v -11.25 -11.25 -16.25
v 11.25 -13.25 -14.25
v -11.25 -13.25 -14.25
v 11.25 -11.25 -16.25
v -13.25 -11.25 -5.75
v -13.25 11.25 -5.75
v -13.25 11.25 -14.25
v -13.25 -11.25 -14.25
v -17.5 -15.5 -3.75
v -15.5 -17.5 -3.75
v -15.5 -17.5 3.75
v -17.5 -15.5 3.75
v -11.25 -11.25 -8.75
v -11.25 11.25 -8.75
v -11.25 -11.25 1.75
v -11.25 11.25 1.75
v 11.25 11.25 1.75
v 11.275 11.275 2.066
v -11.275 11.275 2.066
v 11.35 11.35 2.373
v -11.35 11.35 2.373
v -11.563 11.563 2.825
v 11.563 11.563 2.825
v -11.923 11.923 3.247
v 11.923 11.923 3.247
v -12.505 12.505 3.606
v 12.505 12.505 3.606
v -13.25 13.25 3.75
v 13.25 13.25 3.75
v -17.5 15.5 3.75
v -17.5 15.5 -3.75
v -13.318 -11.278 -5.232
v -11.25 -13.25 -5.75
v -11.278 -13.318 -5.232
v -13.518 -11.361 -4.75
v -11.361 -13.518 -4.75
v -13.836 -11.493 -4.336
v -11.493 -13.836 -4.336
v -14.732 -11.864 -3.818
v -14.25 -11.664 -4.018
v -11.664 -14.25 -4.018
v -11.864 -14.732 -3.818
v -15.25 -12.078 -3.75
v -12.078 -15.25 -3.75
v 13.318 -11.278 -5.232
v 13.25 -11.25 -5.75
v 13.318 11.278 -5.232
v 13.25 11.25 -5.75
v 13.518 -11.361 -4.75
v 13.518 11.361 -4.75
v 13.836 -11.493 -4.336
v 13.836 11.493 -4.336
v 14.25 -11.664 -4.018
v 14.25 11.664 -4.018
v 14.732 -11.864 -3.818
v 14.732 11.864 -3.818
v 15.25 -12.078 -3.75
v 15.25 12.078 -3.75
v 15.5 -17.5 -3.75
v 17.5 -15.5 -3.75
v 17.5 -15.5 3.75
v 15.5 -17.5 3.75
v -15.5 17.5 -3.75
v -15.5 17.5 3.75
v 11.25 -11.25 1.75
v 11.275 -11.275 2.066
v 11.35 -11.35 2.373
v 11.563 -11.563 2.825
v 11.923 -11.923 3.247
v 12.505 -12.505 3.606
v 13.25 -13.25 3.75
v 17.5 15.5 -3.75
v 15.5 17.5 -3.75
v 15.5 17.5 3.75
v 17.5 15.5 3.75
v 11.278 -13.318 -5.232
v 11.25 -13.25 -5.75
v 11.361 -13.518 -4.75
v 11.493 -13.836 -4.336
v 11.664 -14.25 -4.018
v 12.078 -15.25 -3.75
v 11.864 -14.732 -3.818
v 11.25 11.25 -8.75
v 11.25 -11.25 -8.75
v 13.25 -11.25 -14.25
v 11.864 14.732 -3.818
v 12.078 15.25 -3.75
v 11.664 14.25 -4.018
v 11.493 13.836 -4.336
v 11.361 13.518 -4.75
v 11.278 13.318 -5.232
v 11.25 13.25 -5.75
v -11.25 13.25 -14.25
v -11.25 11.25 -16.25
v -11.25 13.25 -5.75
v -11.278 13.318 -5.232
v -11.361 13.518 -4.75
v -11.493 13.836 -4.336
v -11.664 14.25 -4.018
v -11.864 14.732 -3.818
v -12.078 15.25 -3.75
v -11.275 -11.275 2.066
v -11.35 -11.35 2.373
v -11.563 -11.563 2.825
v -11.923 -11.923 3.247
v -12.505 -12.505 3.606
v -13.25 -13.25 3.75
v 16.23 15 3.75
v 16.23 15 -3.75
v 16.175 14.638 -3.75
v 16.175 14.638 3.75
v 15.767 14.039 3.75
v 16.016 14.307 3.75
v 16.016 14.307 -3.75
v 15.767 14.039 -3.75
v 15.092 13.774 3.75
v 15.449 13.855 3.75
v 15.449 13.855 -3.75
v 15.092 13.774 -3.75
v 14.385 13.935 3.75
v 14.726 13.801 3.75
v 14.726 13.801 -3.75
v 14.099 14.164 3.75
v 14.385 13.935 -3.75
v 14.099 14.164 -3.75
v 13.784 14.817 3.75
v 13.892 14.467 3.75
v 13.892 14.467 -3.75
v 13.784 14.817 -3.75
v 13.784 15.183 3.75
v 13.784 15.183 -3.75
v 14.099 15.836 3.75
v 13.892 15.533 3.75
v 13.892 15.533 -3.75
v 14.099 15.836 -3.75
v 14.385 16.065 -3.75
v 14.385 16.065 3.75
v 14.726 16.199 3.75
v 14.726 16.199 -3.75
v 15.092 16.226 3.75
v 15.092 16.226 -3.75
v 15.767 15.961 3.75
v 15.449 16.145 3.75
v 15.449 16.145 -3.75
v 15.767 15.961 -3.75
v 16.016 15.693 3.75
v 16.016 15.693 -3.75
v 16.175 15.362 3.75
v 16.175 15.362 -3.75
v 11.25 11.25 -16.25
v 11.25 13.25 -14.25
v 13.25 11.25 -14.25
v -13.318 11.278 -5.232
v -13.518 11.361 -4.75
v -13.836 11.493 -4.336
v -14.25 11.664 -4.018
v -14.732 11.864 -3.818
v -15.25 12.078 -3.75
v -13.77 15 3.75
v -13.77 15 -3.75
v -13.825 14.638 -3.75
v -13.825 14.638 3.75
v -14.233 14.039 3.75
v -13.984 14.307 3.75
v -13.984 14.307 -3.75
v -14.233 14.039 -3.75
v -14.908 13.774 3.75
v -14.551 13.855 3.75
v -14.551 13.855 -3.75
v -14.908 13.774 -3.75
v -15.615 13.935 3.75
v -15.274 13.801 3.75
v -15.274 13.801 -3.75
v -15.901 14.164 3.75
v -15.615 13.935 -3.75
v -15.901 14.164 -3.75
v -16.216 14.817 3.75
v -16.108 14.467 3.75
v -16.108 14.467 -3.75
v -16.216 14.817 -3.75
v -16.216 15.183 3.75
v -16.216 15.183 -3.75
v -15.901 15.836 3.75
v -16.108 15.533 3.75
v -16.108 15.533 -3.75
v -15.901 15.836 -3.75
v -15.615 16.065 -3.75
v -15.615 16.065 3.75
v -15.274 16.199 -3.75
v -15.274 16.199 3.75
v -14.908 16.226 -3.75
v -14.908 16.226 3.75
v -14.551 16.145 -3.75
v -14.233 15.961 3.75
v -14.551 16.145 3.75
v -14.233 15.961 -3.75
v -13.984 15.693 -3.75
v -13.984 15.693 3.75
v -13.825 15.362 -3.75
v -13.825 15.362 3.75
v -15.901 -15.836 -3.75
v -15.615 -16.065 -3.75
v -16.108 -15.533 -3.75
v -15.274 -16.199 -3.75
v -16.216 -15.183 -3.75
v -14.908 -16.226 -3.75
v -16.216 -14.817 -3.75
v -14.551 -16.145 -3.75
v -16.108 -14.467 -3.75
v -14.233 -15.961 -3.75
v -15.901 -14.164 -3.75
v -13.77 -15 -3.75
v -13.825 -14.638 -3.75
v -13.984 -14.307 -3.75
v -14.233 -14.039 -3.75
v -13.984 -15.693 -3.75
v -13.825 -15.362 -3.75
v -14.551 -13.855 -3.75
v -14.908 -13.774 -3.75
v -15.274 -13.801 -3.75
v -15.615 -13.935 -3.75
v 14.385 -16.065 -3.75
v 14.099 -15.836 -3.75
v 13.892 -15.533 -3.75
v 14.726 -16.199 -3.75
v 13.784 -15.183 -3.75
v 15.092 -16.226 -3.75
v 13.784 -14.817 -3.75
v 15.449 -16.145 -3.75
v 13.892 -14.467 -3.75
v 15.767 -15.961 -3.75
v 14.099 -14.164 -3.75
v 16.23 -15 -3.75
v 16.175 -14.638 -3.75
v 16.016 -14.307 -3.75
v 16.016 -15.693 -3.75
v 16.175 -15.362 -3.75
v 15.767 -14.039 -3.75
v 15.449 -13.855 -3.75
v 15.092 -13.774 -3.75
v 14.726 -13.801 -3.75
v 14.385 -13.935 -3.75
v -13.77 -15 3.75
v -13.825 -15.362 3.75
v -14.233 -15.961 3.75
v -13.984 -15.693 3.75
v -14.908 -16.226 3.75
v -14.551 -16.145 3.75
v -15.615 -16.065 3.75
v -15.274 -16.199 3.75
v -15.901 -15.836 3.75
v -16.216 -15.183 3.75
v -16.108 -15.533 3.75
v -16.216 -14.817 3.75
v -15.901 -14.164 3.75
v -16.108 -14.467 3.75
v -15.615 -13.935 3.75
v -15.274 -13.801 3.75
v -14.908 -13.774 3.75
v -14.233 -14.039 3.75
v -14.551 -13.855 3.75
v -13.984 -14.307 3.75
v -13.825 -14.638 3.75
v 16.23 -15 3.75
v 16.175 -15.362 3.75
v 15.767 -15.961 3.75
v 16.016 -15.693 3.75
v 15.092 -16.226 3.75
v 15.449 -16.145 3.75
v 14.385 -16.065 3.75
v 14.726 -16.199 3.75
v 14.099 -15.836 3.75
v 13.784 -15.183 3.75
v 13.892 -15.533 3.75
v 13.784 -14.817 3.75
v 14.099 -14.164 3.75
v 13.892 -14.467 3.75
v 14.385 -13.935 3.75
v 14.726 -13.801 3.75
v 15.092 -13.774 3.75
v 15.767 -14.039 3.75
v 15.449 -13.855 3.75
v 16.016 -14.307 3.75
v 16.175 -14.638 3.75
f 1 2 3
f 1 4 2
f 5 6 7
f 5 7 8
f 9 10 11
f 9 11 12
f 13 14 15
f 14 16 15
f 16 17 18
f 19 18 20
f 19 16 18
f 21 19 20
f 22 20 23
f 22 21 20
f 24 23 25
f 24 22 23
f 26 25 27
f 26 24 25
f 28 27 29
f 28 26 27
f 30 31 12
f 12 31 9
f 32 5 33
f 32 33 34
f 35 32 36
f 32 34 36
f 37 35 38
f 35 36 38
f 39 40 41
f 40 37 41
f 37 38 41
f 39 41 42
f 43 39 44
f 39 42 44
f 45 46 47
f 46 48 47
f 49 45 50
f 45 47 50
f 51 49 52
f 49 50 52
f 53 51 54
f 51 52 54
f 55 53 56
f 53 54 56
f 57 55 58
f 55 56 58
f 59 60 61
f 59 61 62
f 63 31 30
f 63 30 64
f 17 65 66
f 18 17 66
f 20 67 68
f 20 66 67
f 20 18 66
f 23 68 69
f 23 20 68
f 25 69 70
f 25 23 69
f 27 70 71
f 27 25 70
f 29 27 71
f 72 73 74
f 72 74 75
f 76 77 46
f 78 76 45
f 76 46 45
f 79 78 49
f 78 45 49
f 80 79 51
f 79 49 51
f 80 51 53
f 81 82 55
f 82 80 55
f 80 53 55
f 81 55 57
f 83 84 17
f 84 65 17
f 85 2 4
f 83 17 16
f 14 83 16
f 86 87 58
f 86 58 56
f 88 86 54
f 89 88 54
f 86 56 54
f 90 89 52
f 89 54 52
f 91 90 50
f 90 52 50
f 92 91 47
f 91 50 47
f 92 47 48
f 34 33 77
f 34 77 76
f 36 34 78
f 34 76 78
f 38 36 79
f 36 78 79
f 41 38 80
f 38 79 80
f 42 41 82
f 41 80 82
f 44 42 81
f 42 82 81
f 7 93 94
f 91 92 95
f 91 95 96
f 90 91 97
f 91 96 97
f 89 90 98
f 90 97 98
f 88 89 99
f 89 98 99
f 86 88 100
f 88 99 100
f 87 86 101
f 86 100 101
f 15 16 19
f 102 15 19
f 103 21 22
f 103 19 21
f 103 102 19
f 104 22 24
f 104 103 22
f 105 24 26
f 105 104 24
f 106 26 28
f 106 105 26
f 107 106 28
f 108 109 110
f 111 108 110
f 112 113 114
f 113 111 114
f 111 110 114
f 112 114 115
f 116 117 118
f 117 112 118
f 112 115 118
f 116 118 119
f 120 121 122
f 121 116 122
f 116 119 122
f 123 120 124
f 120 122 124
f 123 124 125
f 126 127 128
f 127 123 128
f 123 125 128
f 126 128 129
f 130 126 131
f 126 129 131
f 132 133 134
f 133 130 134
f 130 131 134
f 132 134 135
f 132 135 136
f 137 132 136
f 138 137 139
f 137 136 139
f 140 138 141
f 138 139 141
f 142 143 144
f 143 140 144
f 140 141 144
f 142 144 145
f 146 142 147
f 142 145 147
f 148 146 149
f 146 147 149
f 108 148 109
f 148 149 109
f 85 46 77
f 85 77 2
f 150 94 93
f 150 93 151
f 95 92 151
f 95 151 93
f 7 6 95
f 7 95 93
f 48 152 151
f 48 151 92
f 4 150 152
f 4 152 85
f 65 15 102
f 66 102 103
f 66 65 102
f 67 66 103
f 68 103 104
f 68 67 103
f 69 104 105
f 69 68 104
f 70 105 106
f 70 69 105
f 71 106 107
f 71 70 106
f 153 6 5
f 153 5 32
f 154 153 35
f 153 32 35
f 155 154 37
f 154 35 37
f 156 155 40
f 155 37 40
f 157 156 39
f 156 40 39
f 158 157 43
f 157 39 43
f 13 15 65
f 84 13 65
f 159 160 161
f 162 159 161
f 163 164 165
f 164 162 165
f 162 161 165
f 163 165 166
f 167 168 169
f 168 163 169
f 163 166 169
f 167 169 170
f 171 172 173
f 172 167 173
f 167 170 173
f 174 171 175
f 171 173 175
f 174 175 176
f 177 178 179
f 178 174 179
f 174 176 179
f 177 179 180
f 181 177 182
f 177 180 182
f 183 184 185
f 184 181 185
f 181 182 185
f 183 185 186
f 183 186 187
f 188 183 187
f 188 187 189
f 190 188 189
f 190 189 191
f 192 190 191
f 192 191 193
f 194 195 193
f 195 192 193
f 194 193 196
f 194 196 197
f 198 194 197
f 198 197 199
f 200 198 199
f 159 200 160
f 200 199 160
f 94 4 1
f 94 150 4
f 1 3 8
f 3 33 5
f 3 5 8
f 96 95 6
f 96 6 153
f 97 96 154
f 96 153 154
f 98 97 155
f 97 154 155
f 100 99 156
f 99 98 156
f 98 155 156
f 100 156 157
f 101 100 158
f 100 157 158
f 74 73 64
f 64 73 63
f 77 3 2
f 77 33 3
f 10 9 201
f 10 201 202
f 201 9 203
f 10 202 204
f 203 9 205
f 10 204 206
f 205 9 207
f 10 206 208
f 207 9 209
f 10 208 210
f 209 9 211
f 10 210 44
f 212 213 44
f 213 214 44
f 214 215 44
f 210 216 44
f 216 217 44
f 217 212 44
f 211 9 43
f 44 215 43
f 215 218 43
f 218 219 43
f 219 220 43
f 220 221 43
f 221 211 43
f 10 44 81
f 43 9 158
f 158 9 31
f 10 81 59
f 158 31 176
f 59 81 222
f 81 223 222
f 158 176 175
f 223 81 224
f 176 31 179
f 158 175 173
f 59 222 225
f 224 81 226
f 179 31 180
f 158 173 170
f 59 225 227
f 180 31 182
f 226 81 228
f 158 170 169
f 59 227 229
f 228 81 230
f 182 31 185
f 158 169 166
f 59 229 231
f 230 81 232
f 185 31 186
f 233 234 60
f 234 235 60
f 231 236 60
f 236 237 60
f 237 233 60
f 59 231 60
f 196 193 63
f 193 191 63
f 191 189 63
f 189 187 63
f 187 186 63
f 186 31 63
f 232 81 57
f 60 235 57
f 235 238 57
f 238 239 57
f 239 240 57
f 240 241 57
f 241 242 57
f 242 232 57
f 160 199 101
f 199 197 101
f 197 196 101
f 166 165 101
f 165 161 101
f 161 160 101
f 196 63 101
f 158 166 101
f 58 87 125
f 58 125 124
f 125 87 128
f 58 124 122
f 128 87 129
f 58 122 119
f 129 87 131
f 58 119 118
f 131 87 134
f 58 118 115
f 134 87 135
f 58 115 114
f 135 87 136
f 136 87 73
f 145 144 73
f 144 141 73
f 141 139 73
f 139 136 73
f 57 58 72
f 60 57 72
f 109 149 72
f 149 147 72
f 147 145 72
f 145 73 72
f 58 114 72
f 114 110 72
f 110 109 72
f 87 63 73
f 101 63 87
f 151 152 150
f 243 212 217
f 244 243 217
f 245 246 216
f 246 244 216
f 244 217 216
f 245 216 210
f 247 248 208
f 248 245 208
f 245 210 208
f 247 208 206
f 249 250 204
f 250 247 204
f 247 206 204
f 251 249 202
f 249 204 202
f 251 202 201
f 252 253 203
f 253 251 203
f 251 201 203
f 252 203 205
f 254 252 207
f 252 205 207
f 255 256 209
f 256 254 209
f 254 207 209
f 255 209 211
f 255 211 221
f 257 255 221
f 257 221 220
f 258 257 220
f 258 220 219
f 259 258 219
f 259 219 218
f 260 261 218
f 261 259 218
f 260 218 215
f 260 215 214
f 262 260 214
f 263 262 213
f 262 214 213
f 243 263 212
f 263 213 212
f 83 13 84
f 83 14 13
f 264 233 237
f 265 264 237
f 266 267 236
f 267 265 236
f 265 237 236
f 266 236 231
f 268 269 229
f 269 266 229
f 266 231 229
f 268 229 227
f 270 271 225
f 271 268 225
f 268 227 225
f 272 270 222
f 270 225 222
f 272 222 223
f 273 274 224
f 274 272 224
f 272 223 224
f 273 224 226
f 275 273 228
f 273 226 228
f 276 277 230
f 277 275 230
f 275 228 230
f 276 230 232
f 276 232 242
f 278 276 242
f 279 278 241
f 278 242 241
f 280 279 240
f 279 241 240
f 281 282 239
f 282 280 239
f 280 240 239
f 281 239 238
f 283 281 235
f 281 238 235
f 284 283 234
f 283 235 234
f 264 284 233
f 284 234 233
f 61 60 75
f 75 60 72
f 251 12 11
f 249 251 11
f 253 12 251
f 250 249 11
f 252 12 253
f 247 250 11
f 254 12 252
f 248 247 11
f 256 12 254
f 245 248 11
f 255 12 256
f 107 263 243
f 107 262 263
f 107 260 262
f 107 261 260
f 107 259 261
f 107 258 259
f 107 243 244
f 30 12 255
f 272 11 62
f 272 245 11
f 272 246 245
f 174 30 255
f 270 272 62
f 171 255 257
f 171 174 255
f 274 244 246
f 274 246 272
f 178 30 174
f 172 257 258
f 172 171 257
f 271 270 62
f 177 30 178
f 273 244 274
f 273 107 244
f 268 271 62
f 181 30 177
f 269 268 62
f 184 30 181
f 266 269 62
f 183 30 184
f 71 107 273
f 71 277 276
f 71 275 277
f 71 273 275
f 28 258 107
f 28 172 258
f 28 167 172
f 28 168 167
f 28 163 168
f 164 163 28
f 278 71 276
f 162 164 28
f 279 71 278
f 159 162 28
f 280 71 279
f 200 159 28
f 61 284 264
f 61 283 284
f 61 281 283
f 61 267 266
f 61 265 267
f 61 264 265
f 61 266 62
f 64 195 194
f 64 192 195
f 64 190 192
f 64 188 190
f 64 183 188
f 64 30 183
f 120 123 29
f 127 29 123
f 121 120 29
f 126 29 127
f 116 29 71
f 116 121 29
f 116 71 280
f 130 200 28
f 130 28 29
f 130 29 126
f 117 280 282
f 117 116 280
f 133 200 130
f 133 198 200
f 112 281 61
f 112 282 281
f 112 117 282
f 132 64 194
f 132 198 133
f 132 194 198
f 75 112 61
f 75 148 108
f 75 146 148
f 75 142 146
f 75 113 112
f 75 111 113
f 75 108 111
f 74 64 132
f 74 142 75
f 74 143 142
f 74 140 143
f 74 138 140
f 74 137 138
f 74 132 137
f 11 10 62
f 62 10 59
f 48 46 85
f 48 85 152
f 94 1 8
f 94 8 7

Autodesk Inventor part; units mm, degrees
ref_plane "YZ Plane" through (0, 0, 0) normal (1, 0, 0) x (0, 1, 0)
ref_plane "XZ Plane" through (0, 0, 0) normal (0, 1, 0) x (-1, 0, 0)
ref_plane "XY Plane" through (0, 0, 0) normal (0, 0, 1) x (1, 0, 0)
sketch "Sketch1" plane through (0, 0, 0) normal (0, 0, 1) x (1, 0, 0)
  circle A0 centre (15, -15) radius 1.2295
  circle A1 centre (-15, 15) radius 1.2295
  circle A2 centre (15, 15) radius 1.2295
  circle A3 centre (-15, -15) radius 1.2295
  line L0 (-15.5, -17.5) -> (-17.5, -15.5)
  line L1 (-15.5, -17.5) -> (15.5, -17.5)
  line L2 (17.5, -15.5) -> (15.5, -17.5)
  line L3 (17.5, -15.5) -> (17.5, 15.5)
  line L4 (15.5, 17.5) -> (17.5, 15.5)
  line L5 (15.5, 17.5) -> (-15.5, 17.5)
  line L6 (-17.5, 15.5) -> (-15.5, 17.5)
  line L7 (-17.5, 15.5) -> (-17.5, -15.5)
  point P0 (0, 0)
  point P1 (0, 0)
  point P2 (0, 0)
extrude "Extrusion1" add sketch "Sketch1" along normal mid plane 7.5
sketch "Sketch4" plane through (0, 0, -3.75) normal (0, 0, -1) x (-1, 0, 0)
  line L0 (-13.25, 13.25) -> (13.25, 13.25)
  line L1 (13.25, 13.25) -> (13.25, -13.25)
  line L2 (13.25, -13.25) -> (-13.25, -13.25)
  line L3 (-13.25, -13.25) -> (-13.25, 13.25)
  line L4 (-17.5, 15.5) -> (-17.5, -15.5) projected
  line L5 (15.5, 17.5) -> (-15.5, 17.5) projected
  point P0 (0, 0)
  point P1 (-13.25, 0)
  point P2 (0, 13.25)
  dimension "d15" = 4.25
  dimension "d16" = 4.25
extrude "Extrusion4" add sketch "Sketch4" along normal blind 12.5
sketch "Sketch5" plane through (0, 0, 3.75) normal (0, 0, 1) x (1, 0, 0)
  line L0 (13.25, -13.25) -> (-13.25, -13.25) projected
  line L1 (-13.25, -13.25) -> (-13.25, 13.25) projected
  line L2 (-13.25, 13.25) -> (13.25, 13.25) projected
  line L3 (13.25, 13.25) -> (13.25, -13.25) projected
  line L4 (-11.25, -11.25) -> (11.25, -11.25)
  line L5 (11.25, -11.25) -> (11.25, 11.25)
  line L6 (11.25, 11.25) -> (-11.25, 11.25)
  line L7 (-11.25, 11.25) -> (-11.25, -11.25)
  point P0 (0, 0)
  dimension "d19" = 2
extrude "Extrusion5" cut sketch "Sketch5" against normal blind 12.5 contours L7 L6 L5 L4
fillet "Fillet2" radius 2 4 edges at (11.25, 0, 3.75) (-11.25, 0, 3.75) (0, 11.25, 3.75) (0, -11.25, 3.75)
chamfer "Chamfer2" distance 2 angle 45 8 edges at (13.25, -13.25, -10) (13.25, 13.25, -10) (-13.25, -13.25, -10) (-13.25, 13.25, -10) (0, -13.25, -16.25) (13.25, 0, -16.25) (0, 13.25, -16.25) (-13.25, 0, -16.25)
fillet "Fillet3" radius 2 8 edges at (13.25, 0, -3.75) (12.25, 12.25, -3.75) (0, 13.25, -3.75) (-12.25, 12.25, -3.75) (-13.25, 0, -3.75) (-12.25, -12.25, -3.75) (0, -13.25, -3.75) (12.25, -12.25, -3.75)
properties part number "Back cover for servo motor 250 W" material "PBT Plastic"
